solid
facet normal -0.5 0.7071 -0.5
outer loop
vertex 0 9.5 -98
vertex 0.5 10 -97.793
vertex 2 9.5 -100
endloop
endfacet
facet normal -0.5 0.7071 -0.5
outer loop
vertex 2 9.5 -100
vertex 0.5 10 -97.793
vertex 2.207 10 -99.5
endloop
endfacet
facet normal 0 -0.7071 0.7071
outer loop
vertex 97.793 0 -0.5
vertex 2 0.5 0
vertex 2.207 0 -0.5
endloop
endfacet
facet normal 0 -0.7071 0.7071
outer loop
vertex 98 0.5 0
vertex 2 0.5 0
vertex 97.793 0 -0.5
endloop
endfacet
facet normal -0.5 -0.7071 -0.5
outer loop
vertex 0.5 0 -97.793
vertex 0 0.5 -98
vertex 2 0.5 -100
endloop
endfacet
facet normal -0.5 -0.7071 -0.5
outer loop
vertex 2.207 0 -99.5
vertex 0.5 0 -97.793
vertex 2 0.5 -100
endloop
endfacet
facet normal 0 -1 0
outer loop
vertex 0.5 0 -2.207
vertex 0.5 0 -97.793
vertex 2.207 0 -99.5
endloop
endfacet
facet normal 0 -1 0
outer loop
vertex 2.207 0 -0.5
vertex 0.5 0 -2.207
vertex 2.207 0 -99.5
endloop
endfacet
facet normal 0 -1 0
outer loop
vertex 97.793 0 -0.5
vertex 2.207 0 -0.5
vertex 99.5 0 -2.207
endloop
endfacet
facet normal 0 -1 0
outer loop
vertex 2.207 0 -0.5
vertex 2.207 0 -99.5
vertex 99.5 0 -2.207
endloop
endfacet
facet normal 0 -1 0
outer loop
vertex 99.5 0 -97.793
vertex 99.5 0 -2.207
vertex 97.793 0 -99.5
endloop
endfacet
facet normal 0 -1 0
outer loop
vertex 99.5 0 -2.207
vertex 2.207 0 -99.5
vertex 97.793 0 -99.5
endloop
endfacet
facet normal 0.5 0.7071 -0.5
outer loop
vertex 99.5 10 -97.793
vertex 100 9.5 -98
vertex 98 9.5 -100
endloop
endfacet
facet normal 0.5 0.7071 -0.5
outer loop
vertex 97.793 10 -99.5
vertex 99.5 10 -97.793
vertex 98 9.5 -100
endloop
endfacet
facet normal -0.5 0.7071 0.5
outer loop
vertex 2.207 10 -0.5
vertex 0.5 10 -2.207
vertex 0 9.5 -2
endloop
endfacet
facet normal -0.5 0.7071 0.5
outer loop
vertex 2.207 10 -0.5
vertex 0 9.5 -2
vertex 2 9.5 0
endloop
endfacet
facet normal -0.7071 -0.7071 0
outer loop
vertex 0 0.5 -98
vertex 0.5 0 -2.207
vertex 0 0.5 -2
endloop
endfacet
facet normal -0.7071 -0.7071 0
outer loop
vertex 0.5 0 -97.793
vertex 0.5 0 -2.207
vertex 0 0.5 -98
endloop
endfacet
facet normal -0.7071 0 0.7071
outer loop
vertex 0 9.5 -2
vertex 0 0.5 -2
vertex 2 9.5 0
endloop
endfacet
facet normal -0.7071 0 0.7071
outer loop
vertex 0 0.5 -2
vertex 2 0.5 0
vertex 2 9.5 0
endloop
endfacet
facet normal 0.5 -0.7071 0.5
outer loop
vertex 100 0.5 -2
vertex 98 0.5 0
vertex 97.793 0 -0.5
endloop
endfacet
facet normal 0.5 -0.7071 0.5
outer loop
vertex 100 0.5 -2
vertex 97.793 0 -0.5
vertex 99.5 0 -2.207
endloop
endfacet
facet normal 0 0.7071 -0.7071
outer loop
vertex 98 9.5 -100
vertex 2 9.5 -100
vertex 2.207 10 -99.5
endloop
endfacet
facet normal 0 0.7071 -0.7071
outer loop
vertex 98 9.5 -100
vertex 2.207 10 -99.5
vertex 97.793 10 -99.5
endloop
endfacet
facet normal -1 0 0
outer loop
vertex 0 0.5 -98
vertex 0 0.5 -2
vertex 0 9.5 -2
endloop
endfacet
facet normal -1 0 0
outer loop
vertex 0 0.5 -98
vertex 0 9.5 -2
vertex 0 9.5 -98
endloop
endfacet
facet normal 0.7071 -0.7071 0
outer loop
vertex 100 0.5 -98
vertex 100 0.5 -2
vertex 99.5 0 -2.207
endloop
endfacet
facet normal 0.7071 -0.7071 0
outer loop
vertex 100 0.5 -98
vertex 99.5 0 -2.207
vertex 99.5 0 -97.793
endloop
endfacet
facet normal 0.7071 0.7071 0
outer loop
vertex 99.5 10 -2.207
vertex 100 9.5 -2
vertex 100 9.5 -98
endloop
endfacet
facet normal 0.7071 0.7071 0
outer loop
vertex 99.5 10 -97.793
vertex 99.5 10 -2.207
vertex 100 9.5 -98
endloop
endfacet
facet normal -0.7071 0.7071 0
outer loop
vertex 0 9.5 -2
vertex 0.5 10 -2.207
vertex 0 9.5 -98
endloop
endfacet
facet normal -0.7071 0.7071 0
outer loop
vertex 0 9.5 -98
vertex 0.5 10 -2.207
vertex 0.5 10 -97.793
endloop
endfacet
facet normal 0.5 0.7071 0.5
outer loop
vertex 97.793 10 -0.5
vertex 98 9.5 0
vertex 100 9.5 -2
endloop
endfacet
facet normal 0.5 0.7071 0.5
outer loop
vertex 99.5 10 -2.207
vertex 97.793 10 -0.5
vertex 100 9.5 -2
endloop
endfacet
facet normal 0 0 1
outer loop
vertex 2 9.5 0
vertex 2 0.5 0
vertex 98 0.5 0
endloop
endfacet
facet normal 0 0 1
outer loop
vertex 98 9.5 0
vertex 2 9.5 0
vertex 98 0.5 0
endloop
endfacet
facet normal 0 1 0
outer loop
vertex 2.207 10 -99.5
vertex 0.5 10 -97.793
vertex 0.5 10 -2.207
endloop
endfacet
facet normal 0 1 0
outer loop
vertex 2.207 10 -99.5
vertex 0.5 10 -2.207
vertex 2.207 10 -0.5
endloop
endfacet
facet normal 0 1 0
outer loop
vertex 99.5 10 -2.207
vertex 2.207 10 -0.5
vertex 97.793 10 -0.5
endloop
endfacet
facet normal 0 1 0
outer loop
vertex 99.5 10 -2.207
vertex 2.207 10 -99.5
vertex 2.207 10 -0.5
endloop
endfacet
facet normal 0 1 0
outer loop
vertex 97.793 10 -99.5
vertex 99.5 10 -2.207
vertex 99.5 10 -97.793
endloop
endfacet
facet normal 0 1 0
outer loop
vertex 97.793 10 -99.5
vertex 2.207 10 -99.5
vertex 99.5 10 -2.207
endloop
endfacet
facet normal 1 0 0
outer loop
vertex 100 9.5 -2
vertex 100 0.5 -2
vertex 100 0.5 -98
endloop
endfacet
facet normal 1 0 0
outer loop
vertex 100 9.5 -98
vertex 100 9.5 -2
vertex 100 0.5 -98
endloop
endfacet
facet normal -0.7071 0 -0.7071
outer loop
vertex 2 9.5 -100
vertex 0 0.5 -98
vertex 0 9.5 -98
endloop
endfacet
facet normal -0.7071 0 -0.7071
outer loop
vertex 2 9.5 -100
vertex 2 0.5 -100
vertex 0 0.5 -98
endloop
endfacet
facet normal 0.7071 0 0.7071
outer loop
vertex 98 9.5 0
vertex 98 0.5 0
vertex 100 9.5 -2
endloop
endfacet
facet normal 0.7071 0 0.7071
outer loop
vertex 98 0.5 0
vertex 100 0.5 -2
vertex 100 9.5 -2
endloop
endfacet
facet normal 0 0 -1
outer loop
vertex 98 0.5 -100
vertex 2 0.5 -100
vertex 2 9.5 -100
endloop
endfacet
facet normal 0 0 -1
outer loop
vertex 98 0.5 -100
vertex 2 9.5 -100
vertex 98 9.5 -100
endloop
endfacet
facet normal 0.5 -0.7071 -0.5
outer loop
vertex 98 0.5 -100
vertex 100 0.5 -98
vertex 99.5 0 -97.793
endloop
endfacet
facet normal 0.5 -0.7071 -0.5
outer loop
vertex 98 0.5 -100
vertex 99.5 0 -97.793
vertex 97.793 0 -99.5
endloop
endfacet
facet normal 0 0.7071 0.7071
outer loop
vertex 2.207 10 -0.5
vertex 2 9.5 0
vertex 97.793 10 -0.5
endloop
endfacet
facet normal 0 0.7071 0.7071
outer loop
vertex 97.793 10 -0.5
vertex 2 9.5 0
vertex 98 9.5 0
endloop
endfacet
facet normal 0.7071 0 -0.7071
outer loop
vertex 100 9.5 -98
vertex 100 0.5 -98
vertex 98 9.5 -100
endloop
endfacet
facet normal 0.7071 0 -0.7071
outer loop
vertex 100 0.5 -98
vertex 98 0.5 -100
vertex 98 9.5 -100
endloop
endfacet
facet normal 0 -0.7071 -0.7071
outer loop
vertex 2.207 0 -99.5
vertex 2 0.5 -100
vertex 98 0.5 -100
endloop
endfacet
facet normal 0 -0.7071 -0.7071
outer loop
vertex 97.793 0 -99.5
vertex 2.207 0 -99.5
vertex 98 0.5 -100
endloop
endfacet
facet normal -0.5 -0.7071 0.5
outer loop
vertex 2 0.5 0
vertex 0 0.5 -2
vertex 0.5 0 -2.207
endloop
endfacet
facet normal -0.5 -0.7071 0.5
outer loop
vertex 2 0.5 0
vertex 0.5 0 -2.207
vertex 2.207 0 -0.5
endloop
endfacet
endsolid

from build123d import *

# Parameters (mm, degrees)
SKETCH1_W           = 100
SKETCH1_H           = 100
BOSS_EXTRUDE1_DEPTH = 10
CHAMFER1_SIZE       = 2
CHAMFER2_SIZE       = 0.5


with BuildPart() as part:
    # Sketch1 → Boss-Extrude1 (new body)
    with BuildSketch(Plane(origin=(0, 0, 0), x_dir=(1, 0, 0), z_dir=(0, 1, 0))):
        with Locations((50, 50)):
            Rectangle(SKETCH1_W, SKETCH1_H)
    extrude(amount=BOSS_EXTRUDE1_DEPTH)

    # Chamfer1
    chamfer1_edges = [part.edges().sort_by_distance(p)[0] for p in [
        (0, 5, -100),
        (100, 5, -100),
        (100, 5, 0),
        (0, 5, 0),
    ]]
    chamfer(chamfer1_edges, length=CHAMFER1_SIZE)

    # Chamfer2
    chamfer2_edges = [part.edges().sort_by_distance(p)[0] for p in [
        (0, 0, -50),
        (0, 10, -50),
        (50, 0, -100),
        (100, 0, -50),
        (50, 0, 0),
        (99, 0, -1),
        (1, 0, -1),
        (99, 0, -99),
        (1, 0, -99),
        (50, 10, -100),
        (50, 10, 0),
        (100, 10, -50),
        (99, 10, -1),
        (1, 10, -1),
        (99, 10, -99),
        (1, 10, -99),
    ]]
    chamfer(chamfer2_edges, length=CHAMFER2_SIZE)


solid = part.part
